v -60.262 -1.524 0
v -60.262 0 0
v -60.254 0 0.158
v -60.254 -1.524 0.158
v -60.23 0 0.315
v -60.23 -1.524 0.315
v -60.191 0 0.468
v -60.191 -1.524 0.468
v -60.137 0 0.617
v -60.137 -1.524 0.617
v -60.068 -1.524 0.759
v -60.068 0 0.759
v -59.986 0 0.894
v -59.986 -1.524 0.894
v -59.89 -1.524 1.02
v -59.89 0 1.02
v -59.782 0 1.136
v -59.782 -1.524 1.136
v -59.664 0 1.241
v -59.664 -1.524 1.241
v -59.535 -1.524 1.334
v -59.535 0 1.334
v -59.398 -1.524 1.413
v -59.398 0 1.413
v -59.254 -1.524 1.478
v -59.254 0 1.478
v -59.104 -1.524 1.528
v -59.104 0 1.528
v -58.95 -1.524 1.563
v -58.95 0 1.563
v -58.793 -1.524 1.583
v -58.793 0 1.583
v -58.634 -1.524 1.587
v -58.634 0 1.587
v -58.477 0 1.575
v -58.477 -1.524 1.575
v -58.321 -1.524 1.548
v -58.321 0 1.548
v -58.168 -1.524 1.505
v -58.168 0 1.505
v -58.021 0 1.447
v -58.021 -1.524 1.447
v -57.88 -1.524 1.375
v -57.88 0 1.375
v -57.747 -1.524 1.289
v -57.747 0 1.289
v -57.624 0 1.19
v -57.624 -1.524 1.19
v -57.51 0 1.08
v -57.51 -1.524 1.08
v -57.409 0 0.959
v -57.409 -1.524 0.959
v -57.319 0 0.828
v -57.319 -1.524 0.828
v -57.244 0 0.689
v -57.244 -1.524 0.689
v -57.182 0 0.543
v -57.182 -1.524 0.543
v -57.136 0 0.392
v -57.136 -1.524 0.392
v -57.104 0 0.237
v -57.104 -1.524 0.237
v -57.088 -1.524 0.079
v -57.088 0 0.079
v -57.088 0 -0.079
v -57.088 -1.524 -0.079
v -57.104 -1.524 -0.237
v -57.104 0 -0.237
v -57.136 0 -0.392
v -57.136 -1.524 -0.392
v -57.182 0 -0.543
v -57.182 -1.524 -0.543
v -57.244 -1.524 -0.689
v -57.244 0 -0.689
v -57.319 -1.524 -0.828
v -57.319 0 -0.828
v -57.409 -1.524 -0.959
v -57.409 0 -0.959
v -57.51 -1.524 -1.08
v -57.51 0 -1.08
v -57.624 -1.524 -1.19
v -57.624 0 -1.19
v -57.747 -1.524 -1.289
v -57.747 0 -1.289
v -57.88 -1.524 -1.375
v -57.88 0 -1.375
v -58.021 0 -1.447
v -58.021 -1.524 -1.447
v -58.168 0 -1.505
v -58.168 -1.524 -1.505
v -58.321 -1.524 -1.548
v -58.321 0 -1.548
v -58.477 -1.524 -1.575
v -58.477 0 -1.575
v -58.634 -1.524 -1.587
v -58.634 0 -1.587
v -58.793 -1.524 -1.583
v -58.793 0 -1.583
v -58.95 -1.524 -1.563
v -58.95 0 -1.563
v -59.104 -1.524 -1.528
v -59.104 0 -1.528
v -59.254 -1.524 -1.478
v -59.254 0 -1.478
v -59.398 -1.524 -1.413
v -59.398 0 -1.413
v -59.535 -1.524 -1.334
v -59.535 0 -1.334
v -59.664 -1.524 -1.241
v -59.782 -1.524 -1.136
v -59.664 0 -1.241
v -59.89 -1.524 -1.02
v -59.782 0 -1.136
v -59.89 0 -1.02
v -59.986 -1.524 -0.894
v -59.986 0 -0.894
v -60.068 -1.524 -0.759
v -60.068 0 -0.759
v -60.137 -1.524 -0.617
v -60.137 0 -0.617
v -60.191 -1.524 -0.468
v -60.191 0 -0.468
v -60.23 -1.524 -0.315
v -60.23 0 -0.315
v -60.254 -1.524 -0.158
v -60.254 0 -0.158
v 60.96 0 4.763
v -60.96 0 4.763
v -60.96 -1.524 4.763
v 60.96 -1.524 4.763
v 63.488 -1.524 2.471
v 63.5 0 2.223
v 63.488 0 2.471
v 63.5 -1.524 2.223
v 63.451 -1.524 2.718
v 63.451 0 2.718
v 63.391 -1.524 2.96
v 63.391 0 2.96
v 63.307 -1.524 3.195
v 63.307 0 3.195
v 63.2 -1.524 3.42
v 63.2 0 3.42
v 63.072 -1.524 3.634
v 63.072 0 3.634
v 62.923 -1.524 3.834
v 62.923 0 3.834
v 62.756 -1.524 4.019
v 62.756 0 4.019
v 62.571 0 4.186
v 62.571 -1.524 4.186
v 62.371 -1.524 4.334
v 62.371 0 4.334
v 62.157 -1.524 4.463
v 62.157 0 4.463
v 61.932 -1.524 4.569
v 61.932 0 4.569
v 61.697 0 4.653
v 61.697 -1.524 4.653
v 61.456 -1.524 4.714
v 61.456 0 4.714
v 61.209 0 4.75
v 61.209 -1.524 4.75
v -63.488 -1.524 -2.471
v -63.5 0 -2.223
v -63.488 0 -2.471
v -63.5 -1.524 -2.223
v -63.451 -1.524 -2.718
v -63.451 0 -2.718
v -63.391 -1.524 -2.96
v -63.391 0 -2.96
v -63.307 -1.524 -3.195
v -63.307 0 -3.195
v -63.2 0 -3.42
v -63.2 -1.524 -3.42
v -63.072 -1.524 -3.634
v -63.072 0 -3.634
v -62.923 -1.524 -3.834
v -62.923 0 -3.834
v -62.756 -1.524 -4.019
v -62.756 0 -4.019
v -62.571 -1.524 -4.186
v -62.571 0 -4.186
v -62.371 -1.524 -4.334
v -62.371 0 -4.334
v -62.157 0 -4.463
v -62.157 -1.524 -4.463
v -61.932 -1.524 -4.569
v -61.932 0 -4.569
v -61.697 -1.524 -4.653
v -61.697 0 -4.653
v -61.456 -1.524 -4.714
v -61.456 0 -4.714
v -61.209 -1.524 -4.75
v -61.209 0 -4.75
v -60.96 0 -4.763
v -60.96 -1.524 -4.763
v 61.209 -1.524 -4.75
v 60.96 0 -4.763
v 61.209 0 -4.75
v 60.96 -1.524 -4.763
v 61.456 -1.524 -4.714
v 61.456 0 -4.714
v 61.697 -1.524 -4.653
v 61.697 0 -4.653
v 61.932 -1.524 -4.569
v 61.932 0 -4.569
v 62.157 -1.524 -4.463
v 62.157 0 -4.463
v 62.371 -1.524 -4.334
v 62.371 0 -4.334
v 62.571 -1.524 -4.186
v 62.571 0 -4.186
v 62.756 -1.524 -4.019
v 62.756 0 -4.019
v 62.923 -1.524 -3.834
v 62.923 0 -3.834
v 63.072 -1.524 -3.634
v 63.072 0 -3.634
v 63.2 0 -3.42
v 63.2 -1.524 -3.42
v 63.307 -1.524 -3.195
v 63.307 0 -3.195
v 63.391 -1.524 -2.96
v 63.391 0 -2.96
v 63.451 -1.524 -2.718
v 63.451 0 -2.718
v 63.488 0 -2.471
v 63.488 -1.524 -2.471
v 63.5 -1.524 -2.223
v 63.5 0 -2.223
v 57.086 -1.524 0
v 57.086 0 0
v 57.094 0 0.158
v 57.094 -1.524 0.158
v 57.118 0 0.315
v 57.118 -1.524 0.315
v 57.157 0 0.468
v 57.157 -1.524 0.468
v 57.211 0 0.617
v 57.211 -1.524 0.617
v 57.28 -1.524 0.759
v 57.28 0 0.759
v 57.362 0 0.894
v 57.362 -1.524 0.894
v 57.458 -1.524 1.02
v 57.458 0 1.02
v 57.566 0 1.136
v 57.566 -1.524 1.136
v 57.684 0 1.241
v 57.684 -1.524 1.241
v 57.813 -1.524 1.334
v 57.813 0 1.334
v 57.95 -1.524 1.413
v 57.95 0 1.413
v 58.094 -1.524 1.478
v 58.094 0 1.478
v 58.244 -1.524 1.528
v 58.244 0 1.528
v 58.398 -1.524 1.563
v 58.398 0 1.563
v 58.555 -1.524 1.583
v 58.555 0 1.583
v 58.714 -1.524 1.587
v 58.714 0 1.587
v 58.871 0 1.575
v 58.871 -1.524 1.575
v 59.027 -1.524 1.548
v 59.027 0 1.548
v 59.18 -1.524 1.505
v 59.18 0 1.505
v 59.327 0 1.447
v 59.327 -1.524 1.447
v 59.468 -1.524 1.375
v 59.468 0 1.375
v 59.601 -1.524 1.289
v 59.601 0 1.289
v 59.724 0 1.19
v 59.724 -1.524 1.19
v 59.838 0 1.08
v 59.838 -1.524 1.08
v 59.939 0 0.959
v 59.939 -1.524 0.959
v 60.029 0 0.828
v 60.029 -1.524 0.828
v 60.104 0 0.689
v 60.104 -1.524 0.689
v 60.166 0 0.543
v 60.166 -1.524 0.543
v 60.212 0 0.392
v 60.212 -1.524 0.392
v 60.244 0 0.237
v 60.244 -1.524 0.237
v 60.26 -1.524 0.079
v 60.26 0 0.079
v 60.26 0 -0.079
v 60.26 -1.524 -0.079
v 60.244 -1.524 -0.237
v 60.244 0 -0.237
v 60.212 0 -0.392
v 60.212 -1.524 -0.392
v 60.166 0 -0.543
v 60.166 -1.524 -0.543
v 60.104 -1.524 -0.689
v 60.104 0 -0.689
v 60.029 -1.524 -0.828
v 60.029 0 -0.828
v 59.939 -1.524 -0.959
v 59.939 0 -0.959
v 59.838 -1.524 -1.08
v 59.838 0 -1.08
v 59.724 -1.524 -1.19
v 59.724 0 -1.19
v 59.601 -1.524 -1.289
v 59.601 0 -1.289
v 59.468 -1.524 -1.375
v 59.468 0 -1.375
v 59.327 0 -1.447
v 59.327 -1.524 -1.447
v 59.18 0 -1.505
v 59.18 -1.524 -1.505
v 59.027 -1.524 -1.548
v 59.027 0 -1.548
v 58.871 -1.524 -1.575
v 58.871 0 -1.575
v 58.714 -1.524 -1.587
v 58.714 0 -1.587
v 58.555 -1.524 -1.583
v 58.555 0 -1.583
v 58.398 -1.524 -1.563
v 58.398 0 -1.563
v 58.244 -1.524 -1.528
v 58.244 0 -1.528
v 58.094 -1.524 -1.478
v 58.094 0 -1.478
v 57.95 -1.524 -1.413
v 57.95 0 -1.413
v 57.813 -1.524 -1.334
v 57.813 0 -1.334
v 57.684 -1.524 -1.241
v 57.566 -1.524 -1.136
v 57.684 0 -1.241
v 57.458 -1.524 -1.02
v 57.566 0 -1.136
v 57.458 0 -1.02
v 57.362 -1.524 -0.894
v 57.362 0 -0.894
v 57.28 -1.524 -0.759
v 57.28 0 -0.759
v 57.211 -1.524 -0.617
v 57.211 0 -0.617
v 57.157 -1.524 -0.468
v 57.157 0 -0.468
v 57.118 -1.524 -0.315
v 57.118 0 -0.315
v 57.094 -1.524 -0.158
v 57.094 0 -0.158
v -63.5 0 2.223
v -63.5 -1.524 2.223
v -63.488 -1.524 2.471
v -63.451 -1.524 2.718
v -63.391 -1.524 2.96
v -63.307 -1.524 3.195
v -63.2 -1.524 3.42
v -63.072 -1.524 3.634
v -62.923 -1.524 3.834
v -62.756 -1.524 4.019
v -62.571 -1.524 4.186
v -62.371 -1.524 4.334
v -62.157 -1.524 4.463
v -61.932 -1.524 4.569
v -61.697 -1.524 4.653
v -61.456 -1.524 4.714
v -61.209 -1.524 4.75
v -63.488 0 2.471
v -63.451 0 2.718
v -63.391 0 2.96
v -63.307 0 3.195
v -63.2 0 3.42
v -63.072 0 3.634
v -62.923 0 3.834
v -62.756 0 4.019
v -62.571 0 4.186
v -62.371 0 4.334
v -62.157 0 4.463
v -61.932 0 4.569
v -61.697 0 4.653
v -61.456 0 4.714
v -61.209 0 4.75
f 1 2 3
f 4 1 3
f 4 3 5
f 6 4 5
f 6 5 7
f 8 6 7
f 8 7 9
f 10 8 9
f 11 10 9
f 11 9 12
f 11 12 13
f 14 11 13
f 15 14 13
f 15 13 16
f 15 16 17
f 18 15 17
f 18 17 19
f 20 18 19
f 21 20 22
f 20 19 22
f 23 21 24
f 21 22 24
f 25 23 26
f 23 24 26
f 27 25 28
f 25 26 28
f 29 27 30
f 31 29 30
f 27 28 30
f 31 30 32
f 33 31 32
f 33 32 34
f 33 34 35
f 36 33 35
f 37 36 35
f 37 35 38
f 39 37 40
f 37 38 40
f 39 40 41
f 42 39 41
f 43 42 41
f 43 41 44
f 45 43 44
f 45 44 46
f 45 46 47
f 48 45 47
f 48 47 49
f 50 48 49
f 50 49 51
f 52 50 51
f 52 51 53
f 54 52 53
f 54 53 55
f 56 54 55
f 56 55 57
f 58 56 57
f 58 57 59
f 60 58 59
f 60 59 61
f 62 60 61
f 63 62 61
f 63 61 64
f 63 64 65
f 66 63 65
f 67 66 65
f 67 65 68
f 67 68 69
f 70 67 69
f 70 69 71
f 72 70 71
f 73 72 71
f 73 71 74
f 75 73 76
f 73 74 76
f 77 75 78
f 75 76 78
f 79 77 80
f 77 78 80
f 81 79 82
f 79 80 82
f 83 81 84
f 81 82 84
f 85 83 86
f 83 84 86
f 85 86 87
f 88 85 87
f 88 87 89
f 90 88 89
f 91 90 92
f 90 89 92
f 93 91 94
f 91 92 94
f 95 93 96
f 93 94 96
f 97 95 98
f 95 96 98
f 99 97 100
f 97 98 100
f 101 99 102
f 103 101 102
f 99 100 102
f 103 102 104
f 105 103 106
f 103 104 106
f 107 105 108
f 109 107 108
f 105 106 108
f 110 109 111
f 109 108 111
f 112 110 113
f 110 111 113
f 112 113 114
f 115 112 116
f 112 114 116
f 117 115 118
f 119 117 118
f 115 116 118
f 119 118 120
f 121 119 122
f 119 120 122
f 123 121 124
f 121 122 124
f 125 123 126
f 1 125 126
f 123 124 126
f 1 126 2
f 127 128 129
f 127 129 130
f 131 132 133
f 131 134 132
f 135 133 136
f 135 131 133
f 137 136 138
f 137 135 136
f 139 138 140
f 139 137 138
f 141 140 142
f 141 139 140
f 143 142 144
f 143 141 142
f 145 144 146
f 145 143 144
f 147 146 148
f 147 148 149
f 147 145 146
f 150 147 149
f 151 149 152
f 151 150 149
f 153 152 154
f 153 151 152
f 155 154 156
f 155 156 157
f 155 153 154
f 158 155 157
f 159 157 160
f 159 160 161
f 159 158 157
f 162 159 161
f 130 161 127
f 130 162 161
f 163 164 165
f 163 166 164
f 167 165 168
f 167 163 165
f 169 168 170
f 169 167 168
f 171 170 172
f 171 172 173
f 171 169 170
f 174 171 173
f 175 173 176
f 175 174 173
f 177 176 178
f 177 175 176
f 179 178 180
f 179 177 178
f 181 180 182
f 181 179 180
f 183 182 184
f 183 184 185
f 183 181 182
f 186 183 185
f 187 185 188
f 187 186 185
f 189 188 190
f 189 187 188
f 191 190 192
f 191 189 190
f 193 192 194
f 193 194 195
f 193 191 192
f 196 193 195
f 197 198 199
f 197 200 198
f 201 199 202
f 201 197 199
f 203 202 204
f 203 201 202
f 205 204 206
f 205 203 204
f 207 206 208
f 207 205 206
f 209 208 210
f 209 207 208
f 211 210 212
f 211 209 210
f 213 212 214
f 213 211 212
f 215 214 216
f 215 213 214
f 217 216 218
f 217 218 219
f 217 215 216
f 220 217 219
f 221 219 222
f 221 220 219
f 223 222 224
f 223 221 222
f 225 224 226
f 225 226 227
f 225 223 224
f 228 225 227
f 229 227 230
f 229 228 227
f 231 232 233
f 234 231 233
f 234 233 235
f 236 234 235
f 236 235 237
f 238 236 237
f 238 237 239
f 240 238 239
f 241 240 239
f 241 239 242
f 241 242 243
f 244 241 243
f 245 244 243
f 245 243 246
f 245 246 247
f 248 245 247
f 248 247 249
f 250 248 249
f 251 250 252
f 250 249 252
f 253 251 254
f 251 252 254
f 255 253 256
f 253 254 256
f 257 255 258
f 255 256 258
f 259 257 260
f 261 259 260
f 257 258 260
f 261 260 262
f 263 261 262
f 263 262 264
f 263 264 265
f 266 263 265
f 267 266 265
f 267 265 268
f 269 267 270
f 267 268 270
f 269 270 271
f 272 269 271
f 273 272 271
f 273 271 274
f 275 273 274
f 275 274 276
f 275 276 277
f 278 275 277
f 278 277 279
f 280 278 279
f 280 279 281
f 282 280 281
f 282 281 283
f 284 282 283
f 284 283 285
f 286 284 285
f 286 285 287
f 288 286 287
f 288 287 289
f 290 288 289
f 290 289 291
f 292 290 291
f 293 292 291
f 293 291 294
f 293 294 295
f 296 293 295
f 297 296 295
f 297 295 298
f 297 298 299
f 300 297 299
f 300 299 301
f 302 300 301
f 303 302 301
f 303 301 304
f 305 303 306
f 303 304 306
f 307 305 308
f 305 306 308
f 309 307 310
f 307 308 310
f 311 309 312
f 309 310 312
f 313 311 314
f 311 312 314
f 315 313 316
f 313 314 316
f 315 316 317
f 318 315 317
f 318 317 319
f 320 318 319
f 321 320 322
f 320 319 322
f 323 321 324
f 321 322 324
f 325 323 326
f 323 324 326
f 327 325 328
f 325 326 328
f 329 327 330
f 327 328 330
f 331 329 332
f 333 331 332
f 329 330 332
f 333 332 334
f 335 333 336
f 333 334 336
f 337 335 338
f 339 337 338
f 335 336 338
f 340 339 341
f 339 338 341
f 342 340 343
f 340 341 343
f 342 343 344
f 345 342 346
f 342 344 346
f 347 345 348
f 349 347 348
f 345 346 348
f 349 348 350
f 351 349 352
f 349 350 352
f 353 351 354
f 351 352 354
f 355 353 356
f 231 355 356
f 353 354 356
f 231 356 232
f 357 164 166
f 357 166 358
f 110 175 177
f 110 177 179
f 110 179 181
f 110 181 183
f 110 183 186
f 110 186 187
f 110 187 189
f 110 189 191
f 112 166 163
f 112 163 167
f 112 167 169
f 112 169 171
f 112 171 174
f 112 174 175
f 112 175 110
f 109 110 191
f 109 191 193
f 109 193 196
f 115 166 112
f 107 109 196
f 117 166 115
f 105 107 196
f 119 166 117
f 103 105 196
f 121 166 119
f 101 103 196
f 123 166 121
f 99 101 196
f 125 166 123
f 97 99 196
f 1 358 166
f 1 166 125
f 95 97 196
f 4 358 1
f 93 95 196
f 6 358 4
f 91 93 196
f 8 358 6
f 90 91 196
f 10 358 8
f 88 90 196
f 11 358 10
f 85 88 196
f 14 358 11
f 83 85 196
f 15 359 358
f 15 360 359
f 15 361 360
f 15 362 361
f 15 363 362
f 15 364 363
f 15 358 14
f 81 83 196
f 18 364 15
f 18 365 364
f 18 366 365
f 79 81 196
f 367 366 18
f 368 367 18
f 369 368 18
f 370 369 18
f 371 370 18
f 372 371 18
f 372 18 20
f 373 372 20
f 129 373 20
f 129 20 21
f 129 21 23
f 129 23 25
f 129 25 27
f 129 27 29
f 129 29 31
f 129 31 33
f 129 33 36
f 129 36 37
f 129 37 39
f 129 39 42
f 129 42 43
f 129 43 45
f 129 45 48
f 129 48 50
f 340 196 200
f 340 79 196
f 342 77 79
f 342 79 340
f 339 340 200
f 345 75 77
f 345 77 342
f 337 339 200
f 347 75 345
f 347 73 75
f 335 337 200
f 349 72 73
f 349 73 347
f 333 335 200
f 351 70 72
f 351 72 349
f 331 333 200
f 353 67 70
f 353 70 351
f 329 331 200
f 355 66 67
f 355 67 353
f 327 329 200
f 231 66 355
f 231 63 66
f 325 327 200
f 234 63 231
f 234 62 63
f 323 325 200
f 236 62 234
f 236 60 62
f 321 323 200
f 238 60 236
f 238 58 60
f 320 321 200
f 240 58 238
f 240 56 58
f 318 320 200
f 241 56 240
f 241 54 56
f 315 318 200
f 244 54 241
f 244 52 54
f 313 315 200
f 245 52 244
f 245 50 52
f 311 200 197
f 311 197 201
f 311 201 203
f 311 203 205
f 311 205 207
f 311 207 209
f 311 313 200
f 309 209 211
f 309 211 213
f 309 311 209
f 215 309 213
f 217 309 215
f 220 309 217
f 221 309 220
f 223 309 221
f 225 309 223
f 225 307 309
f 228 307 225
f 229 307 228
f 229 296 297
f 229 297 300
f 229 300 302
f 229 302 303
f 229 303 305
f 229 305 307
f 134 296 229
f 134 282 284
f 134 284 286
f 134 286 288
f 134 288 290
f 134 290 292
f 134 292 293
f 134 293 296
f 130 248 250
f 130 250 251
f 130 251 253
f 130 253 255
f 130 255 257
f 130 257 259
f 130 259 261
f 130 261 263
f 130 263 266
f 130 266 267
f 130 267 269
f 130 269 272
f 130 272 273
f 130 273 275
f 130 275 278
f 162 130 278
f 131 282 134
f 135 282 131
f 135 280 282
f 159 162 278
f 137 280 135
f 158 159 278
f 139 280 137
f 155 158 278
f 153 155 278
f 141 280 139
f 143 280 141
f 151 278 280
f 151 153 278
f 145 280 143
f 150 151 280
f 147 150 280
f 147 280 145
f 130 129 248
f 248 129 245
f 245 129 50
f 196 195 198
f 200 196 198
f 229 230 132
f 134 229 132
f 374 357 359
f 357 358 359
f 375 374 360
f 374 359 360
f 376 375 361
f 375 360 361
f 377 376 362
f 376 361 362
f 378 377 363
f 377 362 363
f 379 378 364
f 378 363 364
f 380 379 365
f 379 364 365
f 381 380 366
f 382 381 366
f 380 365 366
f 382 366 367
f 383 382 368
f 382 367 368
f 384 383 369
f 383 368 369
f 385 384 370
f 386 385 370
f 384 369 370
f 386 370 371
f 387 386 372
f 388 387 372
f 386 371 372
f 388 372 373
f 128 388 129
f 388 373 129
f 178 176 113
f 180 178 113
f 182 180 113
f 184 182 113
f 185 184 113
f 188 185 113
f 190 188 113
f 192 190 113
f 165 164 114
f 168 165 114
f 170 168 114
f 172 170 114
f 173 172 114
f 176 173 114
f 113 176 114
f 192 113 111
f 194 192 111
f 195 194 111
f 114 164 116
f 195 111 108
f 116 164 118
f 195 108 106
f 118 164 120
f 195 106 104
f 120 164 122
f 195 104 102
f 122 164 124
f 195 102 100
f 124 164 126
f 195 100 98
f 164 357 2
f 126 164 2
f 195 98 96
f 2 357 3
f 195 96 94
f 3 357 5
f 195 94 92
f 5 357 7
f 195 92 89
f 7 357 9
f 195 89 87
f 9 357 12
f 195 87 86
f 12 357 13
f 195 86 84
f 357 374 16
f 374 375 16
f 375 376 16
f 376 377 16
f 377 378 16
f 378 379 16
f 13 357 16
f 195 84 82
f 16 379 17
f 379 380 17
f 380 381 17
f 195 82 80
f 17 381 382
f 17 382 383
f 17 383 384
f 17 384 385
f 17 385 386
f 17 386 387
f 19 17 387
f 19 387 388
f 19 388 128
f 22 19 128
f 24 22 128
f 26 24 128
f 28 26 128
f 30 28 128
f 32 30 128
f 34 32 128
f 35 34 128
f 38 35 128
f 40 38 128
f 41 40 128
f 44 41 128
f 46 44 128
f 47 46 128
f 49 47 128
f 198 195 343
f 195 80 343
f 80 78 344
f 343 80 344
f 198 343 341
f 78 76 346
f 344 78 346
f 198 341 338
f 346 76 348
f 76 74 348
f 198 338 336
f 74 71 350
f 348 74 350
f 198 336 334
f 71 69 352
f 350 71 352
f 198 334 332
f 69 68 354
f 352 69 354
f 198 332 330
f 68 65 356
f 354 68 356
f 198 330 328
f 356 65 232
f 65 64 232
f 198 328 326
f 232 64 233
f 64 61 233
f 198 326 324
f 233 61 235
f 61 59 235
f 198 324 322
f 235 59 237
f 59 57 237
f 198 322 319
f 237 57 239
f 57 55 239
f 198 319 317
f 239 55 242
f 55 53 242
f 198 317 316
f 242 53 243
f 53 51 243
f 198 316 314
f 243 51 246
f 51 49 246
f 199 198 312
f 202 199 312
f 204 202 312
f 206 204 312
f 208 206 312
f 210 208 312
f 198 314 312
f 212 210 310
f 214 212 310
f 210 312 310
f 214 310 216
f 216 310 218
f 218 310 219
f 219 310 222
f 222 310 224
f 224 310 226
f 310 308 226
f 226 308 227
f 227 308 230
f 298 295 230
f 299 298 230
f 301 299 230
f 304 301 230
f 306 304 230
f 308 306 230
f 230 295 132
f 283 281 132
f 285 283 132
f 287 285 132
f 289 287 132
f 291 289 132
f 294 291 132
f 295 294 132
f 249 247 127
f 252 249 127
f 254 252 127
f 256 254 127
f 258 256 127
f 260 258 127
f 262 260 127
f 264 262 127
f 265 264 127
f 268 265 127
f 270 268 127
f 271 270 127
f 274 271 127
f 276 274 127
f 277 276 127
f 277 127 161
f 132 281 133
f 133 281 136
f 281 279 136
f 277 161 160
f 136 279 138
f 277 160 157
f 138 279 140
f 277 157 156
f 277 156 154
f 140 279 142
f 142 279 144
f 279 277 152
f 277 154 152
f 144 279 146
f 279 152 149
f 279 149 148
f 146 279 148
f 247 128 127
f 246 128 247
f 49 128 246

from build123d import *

# Parameters (mm, degrees)
F0_W     = 127
F0_H     = 9.525
F1_DEPTH = 1.524
F2_R     = 2.54
F4_D     = 3.175
F4_DEPTH = 19.05


with BuildPart() as f1:
    # F0 (on Front) → F1 (new body)
    with BuildSketch(Plane.XZ):
        Rectangle(F0_W, F0_H)
    extrude(amount=F1_DEPTH)

    # F2
    f2_edges = [f1.edges().sort_by_distance(p)[0] for p in [
        (-63.5, -0.762, 4.7625),
        (-63.5, -0.762, -4.7625),
        (63.5, -0.762, -4.7625),
        (63.5, -0.762, 4.7625),
    ]]
    fillet(f2_edges, radius=F2_R)

    # F4
    with Locations(Plane.XZ.offset(1.524)):
        with Locations((-58.674, 0), (58.674, 0)):
            Hole(F4_D / 2, depth=F4_DEPTH)


solid = f1.part
